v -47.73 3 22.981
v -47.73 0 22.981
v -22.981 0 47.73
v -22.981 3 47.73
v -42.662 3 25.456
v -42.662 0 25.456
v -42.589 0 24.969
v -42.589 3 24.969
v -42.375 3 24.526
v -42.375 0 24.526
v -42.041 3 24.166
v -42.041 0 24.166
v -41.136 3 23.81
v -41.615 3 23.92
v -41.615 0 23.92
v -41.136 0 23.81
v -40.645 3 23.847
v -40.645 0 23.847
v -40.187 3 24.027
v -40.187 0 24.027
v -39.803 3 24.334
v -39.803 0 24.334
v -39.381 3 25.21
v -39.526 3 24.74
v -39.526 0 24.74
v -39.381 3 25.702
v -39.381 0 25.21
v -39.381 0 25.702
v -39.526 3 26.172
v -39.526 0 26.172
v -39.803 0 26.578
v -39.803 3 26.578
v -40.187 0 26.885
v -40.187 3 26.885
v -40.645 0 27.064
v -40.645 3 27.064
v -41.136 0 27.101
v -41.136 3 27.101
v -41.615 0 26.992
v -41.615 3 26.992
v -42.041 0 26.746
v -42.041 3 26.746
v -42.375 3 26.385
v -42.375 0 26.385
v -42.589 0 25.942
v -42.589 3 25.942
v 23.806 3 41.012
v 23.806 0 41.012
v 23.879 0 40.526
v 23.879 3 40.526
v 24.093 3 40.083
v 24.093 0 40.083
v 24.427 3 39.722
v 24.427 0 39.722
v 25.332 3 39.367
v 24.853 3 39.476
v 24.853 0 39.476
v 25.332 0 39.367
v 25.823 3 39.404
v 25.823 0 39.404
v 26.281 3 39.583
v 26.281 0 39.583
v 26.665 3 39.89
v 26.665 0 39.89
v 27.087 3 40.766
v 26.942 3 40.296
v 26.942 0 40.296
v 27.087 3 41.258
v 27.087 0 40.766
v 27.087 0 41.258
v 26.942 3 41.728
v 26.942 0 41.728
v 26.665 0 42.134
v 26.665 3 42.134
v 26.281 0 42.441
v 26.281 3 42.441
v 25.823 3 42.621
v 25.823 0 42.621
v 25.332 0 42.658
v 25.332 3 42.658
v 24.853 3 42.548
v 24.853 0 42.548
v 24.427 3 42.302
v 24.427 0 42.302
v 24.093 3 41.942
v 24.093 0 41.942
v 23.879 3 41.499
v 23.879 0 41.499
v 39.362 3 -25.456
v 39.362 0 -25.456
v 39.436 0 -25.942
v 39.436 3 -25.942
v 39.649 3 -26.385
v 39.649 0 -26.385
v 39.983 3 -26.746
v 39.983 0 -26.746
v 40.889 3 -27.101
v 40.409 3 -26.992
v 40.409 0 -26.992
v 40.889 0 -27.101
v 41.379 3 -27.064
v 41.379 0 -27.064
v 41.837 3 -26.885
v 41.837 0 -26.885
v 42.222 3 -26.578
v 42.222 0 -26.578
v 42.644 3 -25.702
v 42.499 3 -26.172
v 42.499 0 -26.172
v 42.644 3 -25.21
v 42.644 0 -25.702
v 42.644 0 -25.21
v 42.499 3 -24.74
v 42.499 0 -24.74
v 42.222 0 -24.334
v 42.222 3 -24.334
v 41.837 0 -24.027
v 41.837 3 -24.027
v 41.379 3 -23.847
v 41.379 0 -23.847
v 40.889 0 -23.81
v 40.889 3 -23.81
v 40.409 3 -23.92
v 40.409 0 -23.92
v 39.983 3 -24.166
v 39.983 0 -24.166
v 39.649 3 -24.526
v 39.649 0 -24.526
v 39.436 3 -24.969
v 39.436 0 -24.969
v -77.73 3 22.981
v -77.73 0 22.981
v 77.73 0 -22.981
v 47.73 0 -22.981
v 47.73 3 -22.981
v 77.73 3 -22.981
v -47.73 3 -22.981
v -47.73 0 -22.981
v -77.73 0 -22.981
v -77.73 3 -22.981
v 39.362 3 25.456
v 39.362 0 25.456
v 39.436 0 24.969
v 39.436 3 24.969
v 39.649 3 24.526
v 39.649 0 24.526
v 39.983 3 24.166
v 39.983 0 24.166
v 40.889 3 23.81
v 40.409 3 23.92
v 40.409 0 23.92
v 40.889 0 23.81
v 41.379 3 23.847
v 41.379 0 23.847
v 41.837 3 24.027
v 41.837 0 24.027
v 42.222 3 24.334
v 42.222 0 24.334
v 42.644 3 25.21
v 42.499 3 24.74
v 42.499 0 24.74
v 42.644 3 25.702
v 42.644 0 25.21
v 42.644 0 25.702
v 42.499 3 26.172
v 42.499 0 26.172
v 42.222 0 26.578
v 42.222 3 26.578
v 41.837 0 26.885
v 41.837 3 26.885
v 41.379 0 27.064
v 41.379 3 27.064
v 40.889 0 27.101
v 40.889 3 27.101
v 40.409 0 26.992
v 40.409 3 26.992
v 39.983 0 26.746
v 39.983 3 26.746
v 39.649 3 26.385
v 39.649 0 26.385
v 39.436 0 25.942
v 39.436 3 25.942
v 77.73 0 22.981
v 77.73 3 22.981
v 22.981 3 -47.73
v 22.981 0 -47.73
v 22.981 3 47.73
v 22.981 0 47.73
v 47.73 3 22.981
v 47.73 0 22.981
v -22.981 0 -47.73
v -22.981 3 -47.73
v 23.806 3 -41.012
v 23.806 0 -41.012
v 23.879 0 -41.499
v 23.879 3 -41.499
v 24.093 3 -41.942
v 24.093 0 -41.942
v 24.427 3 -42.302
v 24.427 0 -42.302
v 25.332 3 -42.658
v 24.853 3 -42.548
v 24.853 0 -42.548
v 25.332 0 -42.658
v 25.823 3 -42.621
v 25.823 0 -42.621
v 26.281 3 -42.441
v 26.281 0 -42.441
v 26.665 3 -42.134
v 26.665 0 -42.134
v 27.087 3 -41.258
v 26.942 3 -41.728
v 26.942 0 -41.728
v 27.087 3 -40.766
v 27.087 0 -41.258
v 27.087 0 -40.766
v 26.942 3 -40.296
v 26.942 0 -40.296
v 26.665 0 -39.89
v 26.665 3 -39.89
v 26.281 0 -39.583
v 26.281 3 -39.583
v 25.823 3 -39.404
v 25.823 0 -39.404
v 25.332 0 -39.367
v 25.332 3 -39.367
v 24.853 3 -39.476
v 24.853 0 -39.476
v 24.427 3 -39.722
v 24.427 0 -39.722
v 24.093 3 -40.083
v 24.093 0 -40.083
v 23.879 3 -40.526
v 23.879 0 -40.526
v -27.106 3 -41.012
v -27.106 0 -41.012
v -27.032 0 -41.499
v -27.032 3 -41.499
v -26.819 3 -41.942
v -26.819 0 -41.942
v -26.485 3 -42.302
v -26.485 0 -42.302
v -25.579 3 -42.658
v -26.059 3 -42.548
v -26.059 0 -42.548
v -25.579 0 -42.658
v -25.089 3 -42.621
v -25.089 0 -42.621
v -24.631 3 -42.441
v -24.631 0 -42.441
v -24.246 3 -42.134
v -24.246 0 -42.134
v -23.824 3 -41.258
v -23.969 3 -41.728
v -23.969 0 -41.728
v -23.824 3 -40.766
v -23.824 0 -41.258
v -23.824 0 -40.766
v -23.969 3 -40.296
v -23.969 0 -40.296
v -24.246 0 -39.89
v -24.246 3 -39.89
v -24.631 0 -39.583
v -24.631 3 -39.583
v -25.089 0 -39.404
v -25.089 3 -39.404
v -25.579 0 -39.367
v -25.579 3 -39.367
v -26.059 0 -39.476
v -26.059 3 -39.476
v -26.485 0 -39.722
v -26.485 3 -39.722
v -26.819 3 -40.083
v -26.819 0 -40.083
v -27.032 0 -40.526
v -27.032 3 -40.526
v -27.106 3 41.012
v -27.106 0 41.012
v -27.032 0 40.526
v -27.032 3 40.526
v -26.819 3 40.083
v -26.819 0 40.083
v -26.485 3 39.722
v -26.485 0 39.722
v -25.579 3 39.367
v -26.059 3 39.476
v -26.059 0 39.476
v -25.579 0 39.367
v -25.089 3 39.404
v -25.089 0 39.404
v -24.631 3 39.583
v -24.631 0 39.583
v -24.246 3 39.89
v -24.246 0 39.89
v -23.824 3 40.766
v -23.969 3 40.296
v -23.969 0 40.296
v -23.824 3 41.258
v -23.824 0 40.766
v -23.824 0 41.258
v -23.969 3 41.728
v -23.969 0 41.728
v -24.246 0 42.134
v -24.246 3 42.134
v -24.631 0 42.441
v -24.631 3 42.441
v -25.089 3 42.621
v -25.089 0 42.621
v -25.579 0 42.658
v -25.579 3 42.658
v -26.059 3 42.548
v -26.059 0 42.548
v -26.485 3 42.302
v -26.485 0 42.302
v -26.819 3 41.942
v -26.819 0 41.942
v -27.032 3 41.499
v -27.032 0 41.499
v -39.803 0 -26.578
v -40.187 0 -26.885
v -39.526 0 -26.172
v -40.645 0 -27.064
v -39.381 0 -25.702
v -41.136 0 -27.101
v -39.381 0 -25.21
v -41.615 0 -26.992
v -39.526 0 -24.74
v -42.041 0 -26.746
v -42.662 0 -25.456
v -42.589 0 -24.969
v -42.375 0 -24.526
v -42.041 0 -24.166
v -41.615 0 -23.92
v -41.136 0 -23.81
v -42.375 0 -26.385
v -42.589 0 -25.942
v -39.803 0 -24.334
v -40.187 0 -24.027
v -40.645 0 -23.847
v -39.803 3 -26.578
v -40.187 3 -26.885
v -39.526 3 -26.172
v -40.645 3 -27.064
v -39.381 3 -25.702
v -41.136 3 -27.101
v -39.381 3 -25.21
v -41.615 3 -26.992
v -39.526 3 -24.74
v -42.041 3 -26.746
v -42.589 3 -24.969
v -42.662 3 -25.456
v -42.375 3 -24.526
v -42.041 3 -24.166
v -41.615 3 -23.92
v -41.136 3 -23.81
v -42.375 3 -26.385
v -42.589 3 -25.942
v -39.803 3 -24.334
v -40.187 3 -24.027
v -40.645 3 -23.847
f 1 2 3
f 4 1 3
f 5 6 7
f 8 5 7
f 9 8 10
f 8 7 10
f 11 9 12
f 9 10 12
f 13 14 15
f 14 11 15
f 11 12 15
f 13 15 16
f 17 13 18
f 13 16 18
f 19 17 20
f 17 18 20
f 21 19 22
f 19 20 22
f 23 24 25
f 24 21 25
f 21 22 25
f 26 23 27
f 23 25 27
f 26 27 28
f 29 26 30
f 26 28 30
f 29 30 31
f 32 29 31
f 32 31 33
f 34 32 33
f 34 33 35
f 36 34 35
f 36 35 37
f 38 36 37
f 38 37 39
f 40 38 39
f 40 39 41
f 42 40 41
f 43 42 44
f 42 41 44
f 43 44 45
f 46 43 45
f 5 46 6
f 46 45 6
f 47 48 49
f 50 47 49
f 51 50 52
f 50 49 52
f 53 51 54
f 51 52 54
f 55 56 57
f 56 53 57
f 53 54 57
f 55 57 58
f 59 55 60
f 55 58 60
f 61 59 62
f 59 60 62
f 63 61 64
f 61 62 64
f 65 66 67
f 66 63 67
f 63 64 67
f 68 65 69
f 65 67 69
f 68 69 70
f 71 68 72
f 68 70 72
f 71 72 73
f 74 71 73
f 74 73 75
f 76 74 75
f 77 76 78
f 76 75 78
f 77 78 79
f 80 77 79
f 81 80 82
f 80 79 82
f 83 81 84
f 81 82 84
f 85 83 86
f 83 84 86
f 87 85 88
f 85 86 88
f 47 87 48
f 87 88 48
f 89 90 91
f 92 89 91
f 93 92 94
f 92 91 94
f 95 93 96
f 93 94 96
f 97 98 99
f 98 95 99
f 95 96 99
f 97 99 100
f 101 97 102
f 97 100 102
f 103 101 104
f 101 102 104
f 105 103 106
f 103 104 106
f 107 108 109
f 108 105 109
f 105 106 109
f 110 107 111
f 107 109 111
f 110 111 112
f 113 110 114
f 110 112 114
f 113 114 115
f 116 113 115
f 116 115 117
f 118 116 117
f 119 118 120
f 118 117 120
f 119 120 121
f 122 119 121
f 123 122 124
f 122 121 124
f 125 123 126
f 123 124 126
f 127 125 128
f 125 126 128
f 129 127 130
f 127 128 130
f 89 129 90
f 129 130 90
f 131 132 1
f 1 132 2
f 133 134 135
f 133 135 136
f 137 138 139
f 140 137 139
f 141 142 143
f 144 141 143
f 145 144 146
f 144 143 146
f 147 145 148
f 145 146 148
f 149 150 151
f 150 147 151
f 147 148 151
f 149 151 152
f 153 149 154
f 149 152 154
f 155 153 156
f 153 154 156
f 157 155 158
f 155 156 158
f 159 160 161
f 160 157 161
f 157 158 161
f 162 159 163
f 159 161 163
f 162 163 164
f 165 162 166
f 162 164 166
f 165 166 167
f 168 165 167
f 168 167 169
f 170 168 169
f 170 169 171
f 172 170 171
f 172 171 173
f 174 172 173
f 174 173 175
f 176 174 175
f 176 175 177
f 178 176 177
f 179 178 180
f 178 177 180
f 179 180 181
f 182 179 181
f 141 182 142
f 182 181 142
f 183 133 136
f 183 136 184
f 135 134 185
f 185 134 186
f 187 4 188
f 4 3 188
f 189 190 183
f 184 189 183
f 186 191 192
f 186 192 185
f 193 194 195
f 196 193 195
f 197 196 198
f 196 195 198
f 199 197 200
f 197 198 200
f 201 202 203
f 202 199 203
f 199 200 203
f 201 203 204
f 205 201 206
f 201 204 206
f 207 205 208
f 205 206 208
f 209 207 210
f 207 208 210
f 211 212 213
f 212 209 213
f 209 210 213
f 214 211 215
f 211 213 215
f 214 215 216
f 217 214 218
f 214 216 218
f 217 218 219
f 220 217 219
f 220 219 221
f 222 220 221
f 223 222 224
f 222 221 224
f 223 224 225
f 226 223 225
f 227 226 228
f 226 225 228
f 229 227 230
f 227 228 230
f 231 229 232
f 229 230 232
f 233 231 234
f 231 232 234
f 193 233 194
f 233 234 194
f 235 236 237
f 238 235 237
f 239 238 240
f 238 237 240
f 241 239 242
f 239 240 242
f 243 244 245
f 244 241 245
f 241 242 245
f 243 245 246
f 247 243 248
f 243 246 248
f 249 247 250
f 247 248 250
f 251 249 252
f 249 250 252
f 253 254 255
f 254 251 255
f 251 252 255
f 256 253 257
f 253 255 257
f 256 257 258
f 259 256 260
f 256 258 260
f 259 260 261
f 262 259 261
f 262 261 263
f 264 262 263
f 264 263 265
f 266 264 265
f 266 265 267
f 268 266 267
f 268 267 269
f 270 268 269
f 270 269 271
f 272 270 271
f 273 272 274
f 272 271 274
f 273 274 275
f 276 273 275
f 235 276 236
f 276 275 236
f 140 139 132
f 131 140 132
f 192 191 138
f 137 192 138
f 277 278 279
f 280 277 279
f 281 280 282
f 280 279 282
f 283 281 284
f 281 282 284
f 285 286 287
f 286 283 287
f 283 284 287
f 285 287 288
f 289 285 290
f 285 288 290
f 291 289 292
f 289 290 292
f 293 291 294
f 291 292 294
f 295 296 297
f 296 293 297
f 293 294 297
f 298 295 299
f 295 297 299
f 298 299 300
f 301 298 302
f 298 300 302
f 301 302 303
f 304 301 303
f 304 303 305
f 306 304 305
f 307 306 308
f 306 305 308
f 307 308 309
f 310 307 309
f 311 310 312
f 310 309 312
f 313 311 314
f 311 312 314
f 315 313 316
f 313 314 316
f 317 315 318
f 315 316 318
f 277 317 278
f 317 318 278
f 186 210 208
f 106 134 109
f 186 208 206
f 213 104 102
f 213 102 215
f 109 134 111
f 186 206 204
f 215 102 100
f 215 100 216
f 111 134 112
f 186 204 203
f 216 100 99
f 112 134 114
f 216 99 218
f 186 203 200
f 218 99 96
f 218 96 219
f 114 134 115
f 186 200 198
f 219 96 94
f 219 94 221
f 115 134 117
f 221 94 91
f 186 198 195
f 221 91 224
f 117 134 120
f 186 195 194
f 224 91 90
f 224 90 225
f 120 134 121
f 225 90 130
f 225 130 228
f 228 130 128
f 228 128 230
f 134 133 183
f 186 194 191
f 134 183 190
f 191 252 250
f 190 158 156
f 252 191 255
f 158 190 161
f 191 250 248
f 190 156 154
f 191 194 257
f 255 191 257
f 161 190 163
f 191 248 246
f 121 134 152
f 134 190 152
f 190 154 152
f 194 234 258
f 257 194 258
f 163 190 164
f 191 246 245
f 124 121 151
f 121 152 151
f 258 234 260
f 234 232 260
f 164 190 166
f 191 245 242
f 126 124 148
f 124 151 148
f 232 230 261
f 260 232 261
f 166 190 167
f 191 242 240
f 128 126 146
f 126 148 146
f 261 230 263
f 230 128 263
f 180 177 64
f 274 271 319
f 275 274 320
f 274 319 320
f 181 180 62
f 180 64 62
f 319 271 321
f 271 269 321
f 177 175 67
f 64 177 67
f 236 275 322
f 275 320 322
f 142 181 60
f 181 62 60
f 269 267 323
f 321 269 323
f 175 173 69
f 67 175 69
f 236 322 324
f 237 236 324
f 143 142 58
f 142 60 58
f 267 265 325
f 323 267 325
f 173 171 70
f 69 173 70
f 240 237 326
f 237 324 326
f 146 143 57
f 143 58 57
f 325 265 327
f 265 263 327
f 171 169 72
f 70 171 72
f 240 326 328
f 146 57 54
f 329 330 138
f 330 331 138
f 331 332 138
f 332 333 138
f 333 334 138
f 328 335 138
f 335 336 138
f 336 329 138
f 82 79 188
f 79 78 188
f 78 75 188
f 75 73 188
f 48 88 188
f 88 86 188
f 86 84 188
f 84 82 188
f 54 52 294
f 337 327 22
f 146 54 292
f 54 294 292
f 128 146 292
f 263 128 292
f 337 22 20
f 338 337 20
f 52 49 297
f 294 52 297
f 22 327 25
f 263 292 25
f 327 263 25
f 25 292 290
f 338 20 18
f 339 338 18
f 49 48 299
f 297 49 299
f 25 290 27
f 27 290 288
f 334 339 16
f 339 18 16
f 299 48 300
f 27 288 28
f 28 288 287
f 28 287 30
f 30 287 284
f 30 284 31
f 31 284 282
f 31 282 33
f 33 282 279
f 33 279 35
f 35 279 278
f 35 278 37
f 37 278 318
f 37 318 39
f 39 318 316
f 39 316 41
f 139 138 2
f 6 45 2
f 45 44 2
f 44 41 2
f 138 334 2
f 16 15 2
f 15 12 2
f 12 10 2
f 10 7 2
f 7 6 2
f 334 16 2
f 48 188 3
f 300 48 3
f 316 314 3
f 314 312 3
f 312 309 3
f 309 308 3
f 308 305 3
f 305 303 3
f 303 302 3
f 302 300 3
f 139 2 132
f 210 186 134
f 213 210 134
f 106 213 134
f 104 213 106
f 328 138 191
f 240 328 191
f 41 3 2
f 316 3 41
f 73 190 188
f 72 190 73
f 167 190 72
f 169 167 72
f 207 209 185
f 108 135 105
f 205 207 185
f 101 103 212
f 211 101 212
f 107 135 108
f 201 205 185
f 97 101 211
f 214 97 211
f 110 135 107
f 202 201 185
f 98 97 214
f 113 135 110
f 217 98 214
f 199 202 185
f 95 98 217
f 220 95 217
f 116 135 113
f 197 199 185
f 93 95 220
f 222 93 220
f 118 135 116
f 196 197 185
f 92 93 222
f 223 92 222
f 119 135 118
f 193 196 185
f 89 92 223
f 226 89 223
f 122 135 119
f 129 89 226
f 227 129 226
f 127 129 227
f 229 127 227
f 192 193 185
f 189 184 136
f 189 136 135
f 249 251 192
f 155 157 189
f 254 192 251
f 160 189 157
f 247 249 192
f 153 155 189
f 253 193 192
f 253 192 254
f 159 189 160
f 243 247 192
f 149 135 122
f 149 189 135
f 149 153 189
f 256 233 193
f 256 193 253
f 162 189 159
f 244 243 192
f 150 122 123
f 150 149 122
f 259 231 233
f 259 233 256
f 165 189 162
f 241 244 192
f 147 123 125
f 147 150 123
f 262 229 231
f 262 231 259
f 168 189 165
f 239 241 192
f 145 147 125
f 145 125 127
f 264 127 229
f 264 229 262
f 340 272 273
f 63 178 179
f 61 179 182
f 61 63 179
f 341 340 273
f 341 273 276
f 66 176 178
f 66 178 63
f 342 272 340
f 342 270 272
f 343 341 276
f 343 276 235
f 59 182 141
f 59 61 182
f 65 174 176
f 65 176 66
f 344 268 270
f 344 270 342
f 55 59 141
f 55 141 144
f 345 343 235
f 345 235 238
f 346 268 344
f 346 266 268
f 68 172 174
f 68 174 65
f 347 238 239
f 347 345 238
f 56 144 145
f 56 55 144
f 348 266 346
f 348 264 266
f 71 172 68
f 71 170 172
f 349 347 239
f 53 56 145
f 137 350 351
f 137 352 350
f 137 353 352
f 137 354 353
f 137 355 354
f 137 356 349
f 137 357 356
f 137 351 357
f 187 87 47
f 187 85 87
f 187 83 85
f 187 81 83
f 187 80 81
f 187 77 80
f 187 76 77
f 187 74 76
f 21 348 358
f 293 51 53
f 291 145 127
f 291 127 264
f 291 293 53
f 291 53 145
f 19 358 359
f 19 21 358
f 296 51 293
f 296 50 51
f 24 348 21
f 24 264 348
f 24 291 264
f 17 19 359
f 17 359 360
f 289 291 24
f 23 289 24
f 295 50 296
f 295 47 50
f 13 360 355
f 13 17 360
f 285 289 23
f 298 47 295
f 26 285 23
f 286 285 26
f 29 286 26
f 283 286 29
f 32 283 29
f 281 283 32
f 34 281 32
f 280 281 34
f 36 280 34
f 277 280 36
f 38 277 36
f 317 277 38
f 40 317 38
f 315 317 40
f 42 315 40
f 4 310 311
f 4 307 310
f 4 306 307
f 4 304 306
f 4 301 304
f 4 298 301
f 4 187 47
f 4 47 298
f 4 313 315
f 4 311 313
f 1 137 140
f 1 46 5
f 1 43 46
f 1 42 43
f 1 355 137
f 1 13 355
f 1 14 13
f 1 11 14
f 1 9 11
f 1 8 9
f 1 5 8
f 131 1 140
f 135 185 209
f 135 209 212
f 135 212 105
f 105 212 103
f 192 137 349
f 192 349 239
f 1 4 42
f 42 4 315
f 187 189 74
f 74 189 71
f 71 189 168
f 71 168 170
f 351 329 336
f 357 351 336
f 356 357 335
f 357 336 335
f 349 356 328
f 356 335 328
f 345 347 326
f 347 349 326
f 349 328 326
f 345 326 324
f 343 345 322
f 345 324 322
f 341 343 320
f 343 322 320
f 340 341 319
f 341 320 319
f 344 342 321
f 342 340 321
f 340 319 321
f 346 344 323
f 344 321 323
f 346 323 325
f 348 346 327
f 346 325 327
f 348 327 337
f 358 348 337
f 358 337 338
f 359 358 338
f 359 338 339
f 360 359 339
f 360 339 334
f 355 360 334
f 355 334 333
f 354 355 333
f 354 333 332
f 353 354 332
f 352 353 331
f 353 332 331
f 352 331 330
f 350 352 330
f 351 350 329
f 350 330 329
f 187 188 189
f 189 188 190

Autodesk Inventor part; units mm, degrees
ref_plane "YZ Plane" through (0, 0, 0) normal (1, 0, 0) x (0, 1, 0)
ref_plane "XZ Plane" through (0, 0, 0) normal (0, 1, 0) x (-1, 0, 0)
ref_plane "XY Plane" through (0, 0, 0) normal (0, 0, 1) x (1, 0, 0)
sketch "草图1" plane through (0, 0, 0) normal (0, 1, 0) x (-1, 0, 0)
  line L0 (35.3553, 35.3553) -> (-35.3553, 35.3553)
  line L1 (-35.3553, 35.3553) -> (-35.3553, -35.3553)
  line L2 (-35.3553, -35.3553) -> (35.3553, -35.3553)
  line L3 (35.3553, -35.3553) -> (35.3553, 35.3553)
  line L4 (35.3553, 35.3553) -> (-35.3553, -35.3553)
  line L5 (35.3553, -35.3553) -> (-35.3553, 35.3553)
  line L6 (-22.981, 47.7297) -> (-47.7297, 22.981)
  line L7 (-47.7297, -22.981) -> (-22.981, -47.7297)
  line L8 (22.981, -47.7297) -> (47.7297, -22.981)
  line L9 (47.7297, 22.981) -> (22.981, 47.7297)
  line L10 (22.981, 47.7297) -> (-22.981, 47.7297)
  line L11 (47.7297, 22.981) -> (47.7297, -22.981)
  line L12 (22.981, -47.7297) -> (-22.981, -47.7297)
  line L13 (-47.7297, -22.981) -> (-47.7297, 22.981)
  circle A0 centre (41.0122, 25.4558) radius 1.65
  circle A1 centre (25.4558, 41.0122) radius 1.65
  circle A2 centre (-41.0122, 25.4558) radius 1.65
  circle A3 centre (-25.4558, 41.0122) radius 1.65
  circle A4 centre (-25.4558, -41.0122) radius 1.65
  circle A5 centre (-41.0122, -25.4558) radius 1.65
  circle A6 centre (41.0122, -25.4558) radius 1.65
  circle A7 centre (25.4558, -41.0122) radius 1.65
  line L14 (-47.7297, -22.981) -> (-77.7297, -22.981)
  line L15 (-77.7297, -22.981) -> (-77.7297, 22.981)
  line L16 (-47.7297, 22.6987) -> (-47.7297, -22.981)
  line L17 (-47.7297, 22.981) -> (-77.7297, 22.981)
  line L18 (47.7297, -22.981) -> (77.7297, -22.981)
  line L19 (77.7297, -22.981) -> (77.7297, 22.981)
  line L20 (77.7297, 22.981) -> (47.7297, 22.981)
  point P0 (0, 0)
  point P1 (0, 0)
  point P2 (0, 0)
  point P3 (-35.3553, -35.3553)
  point P4 (35.3553, -35.3553)
  point P5 (35.3553, 35.3553)
  point P6 (0, 0)
  dimension "d4" = 100
  dimension "d5" = 35
  dimension "d6" = 45
  dimension "d7" = 360
  dimension "d8" = 3.3
  dimension "d9" = 3
  dimension "d10" = 11
  dimension "d18" = 360
  dimension "d20" = 30
  dimension "d23" = 30
extrude "拉伸1" add sketch "草图1" along normal blind 3
properties part number "下板"
